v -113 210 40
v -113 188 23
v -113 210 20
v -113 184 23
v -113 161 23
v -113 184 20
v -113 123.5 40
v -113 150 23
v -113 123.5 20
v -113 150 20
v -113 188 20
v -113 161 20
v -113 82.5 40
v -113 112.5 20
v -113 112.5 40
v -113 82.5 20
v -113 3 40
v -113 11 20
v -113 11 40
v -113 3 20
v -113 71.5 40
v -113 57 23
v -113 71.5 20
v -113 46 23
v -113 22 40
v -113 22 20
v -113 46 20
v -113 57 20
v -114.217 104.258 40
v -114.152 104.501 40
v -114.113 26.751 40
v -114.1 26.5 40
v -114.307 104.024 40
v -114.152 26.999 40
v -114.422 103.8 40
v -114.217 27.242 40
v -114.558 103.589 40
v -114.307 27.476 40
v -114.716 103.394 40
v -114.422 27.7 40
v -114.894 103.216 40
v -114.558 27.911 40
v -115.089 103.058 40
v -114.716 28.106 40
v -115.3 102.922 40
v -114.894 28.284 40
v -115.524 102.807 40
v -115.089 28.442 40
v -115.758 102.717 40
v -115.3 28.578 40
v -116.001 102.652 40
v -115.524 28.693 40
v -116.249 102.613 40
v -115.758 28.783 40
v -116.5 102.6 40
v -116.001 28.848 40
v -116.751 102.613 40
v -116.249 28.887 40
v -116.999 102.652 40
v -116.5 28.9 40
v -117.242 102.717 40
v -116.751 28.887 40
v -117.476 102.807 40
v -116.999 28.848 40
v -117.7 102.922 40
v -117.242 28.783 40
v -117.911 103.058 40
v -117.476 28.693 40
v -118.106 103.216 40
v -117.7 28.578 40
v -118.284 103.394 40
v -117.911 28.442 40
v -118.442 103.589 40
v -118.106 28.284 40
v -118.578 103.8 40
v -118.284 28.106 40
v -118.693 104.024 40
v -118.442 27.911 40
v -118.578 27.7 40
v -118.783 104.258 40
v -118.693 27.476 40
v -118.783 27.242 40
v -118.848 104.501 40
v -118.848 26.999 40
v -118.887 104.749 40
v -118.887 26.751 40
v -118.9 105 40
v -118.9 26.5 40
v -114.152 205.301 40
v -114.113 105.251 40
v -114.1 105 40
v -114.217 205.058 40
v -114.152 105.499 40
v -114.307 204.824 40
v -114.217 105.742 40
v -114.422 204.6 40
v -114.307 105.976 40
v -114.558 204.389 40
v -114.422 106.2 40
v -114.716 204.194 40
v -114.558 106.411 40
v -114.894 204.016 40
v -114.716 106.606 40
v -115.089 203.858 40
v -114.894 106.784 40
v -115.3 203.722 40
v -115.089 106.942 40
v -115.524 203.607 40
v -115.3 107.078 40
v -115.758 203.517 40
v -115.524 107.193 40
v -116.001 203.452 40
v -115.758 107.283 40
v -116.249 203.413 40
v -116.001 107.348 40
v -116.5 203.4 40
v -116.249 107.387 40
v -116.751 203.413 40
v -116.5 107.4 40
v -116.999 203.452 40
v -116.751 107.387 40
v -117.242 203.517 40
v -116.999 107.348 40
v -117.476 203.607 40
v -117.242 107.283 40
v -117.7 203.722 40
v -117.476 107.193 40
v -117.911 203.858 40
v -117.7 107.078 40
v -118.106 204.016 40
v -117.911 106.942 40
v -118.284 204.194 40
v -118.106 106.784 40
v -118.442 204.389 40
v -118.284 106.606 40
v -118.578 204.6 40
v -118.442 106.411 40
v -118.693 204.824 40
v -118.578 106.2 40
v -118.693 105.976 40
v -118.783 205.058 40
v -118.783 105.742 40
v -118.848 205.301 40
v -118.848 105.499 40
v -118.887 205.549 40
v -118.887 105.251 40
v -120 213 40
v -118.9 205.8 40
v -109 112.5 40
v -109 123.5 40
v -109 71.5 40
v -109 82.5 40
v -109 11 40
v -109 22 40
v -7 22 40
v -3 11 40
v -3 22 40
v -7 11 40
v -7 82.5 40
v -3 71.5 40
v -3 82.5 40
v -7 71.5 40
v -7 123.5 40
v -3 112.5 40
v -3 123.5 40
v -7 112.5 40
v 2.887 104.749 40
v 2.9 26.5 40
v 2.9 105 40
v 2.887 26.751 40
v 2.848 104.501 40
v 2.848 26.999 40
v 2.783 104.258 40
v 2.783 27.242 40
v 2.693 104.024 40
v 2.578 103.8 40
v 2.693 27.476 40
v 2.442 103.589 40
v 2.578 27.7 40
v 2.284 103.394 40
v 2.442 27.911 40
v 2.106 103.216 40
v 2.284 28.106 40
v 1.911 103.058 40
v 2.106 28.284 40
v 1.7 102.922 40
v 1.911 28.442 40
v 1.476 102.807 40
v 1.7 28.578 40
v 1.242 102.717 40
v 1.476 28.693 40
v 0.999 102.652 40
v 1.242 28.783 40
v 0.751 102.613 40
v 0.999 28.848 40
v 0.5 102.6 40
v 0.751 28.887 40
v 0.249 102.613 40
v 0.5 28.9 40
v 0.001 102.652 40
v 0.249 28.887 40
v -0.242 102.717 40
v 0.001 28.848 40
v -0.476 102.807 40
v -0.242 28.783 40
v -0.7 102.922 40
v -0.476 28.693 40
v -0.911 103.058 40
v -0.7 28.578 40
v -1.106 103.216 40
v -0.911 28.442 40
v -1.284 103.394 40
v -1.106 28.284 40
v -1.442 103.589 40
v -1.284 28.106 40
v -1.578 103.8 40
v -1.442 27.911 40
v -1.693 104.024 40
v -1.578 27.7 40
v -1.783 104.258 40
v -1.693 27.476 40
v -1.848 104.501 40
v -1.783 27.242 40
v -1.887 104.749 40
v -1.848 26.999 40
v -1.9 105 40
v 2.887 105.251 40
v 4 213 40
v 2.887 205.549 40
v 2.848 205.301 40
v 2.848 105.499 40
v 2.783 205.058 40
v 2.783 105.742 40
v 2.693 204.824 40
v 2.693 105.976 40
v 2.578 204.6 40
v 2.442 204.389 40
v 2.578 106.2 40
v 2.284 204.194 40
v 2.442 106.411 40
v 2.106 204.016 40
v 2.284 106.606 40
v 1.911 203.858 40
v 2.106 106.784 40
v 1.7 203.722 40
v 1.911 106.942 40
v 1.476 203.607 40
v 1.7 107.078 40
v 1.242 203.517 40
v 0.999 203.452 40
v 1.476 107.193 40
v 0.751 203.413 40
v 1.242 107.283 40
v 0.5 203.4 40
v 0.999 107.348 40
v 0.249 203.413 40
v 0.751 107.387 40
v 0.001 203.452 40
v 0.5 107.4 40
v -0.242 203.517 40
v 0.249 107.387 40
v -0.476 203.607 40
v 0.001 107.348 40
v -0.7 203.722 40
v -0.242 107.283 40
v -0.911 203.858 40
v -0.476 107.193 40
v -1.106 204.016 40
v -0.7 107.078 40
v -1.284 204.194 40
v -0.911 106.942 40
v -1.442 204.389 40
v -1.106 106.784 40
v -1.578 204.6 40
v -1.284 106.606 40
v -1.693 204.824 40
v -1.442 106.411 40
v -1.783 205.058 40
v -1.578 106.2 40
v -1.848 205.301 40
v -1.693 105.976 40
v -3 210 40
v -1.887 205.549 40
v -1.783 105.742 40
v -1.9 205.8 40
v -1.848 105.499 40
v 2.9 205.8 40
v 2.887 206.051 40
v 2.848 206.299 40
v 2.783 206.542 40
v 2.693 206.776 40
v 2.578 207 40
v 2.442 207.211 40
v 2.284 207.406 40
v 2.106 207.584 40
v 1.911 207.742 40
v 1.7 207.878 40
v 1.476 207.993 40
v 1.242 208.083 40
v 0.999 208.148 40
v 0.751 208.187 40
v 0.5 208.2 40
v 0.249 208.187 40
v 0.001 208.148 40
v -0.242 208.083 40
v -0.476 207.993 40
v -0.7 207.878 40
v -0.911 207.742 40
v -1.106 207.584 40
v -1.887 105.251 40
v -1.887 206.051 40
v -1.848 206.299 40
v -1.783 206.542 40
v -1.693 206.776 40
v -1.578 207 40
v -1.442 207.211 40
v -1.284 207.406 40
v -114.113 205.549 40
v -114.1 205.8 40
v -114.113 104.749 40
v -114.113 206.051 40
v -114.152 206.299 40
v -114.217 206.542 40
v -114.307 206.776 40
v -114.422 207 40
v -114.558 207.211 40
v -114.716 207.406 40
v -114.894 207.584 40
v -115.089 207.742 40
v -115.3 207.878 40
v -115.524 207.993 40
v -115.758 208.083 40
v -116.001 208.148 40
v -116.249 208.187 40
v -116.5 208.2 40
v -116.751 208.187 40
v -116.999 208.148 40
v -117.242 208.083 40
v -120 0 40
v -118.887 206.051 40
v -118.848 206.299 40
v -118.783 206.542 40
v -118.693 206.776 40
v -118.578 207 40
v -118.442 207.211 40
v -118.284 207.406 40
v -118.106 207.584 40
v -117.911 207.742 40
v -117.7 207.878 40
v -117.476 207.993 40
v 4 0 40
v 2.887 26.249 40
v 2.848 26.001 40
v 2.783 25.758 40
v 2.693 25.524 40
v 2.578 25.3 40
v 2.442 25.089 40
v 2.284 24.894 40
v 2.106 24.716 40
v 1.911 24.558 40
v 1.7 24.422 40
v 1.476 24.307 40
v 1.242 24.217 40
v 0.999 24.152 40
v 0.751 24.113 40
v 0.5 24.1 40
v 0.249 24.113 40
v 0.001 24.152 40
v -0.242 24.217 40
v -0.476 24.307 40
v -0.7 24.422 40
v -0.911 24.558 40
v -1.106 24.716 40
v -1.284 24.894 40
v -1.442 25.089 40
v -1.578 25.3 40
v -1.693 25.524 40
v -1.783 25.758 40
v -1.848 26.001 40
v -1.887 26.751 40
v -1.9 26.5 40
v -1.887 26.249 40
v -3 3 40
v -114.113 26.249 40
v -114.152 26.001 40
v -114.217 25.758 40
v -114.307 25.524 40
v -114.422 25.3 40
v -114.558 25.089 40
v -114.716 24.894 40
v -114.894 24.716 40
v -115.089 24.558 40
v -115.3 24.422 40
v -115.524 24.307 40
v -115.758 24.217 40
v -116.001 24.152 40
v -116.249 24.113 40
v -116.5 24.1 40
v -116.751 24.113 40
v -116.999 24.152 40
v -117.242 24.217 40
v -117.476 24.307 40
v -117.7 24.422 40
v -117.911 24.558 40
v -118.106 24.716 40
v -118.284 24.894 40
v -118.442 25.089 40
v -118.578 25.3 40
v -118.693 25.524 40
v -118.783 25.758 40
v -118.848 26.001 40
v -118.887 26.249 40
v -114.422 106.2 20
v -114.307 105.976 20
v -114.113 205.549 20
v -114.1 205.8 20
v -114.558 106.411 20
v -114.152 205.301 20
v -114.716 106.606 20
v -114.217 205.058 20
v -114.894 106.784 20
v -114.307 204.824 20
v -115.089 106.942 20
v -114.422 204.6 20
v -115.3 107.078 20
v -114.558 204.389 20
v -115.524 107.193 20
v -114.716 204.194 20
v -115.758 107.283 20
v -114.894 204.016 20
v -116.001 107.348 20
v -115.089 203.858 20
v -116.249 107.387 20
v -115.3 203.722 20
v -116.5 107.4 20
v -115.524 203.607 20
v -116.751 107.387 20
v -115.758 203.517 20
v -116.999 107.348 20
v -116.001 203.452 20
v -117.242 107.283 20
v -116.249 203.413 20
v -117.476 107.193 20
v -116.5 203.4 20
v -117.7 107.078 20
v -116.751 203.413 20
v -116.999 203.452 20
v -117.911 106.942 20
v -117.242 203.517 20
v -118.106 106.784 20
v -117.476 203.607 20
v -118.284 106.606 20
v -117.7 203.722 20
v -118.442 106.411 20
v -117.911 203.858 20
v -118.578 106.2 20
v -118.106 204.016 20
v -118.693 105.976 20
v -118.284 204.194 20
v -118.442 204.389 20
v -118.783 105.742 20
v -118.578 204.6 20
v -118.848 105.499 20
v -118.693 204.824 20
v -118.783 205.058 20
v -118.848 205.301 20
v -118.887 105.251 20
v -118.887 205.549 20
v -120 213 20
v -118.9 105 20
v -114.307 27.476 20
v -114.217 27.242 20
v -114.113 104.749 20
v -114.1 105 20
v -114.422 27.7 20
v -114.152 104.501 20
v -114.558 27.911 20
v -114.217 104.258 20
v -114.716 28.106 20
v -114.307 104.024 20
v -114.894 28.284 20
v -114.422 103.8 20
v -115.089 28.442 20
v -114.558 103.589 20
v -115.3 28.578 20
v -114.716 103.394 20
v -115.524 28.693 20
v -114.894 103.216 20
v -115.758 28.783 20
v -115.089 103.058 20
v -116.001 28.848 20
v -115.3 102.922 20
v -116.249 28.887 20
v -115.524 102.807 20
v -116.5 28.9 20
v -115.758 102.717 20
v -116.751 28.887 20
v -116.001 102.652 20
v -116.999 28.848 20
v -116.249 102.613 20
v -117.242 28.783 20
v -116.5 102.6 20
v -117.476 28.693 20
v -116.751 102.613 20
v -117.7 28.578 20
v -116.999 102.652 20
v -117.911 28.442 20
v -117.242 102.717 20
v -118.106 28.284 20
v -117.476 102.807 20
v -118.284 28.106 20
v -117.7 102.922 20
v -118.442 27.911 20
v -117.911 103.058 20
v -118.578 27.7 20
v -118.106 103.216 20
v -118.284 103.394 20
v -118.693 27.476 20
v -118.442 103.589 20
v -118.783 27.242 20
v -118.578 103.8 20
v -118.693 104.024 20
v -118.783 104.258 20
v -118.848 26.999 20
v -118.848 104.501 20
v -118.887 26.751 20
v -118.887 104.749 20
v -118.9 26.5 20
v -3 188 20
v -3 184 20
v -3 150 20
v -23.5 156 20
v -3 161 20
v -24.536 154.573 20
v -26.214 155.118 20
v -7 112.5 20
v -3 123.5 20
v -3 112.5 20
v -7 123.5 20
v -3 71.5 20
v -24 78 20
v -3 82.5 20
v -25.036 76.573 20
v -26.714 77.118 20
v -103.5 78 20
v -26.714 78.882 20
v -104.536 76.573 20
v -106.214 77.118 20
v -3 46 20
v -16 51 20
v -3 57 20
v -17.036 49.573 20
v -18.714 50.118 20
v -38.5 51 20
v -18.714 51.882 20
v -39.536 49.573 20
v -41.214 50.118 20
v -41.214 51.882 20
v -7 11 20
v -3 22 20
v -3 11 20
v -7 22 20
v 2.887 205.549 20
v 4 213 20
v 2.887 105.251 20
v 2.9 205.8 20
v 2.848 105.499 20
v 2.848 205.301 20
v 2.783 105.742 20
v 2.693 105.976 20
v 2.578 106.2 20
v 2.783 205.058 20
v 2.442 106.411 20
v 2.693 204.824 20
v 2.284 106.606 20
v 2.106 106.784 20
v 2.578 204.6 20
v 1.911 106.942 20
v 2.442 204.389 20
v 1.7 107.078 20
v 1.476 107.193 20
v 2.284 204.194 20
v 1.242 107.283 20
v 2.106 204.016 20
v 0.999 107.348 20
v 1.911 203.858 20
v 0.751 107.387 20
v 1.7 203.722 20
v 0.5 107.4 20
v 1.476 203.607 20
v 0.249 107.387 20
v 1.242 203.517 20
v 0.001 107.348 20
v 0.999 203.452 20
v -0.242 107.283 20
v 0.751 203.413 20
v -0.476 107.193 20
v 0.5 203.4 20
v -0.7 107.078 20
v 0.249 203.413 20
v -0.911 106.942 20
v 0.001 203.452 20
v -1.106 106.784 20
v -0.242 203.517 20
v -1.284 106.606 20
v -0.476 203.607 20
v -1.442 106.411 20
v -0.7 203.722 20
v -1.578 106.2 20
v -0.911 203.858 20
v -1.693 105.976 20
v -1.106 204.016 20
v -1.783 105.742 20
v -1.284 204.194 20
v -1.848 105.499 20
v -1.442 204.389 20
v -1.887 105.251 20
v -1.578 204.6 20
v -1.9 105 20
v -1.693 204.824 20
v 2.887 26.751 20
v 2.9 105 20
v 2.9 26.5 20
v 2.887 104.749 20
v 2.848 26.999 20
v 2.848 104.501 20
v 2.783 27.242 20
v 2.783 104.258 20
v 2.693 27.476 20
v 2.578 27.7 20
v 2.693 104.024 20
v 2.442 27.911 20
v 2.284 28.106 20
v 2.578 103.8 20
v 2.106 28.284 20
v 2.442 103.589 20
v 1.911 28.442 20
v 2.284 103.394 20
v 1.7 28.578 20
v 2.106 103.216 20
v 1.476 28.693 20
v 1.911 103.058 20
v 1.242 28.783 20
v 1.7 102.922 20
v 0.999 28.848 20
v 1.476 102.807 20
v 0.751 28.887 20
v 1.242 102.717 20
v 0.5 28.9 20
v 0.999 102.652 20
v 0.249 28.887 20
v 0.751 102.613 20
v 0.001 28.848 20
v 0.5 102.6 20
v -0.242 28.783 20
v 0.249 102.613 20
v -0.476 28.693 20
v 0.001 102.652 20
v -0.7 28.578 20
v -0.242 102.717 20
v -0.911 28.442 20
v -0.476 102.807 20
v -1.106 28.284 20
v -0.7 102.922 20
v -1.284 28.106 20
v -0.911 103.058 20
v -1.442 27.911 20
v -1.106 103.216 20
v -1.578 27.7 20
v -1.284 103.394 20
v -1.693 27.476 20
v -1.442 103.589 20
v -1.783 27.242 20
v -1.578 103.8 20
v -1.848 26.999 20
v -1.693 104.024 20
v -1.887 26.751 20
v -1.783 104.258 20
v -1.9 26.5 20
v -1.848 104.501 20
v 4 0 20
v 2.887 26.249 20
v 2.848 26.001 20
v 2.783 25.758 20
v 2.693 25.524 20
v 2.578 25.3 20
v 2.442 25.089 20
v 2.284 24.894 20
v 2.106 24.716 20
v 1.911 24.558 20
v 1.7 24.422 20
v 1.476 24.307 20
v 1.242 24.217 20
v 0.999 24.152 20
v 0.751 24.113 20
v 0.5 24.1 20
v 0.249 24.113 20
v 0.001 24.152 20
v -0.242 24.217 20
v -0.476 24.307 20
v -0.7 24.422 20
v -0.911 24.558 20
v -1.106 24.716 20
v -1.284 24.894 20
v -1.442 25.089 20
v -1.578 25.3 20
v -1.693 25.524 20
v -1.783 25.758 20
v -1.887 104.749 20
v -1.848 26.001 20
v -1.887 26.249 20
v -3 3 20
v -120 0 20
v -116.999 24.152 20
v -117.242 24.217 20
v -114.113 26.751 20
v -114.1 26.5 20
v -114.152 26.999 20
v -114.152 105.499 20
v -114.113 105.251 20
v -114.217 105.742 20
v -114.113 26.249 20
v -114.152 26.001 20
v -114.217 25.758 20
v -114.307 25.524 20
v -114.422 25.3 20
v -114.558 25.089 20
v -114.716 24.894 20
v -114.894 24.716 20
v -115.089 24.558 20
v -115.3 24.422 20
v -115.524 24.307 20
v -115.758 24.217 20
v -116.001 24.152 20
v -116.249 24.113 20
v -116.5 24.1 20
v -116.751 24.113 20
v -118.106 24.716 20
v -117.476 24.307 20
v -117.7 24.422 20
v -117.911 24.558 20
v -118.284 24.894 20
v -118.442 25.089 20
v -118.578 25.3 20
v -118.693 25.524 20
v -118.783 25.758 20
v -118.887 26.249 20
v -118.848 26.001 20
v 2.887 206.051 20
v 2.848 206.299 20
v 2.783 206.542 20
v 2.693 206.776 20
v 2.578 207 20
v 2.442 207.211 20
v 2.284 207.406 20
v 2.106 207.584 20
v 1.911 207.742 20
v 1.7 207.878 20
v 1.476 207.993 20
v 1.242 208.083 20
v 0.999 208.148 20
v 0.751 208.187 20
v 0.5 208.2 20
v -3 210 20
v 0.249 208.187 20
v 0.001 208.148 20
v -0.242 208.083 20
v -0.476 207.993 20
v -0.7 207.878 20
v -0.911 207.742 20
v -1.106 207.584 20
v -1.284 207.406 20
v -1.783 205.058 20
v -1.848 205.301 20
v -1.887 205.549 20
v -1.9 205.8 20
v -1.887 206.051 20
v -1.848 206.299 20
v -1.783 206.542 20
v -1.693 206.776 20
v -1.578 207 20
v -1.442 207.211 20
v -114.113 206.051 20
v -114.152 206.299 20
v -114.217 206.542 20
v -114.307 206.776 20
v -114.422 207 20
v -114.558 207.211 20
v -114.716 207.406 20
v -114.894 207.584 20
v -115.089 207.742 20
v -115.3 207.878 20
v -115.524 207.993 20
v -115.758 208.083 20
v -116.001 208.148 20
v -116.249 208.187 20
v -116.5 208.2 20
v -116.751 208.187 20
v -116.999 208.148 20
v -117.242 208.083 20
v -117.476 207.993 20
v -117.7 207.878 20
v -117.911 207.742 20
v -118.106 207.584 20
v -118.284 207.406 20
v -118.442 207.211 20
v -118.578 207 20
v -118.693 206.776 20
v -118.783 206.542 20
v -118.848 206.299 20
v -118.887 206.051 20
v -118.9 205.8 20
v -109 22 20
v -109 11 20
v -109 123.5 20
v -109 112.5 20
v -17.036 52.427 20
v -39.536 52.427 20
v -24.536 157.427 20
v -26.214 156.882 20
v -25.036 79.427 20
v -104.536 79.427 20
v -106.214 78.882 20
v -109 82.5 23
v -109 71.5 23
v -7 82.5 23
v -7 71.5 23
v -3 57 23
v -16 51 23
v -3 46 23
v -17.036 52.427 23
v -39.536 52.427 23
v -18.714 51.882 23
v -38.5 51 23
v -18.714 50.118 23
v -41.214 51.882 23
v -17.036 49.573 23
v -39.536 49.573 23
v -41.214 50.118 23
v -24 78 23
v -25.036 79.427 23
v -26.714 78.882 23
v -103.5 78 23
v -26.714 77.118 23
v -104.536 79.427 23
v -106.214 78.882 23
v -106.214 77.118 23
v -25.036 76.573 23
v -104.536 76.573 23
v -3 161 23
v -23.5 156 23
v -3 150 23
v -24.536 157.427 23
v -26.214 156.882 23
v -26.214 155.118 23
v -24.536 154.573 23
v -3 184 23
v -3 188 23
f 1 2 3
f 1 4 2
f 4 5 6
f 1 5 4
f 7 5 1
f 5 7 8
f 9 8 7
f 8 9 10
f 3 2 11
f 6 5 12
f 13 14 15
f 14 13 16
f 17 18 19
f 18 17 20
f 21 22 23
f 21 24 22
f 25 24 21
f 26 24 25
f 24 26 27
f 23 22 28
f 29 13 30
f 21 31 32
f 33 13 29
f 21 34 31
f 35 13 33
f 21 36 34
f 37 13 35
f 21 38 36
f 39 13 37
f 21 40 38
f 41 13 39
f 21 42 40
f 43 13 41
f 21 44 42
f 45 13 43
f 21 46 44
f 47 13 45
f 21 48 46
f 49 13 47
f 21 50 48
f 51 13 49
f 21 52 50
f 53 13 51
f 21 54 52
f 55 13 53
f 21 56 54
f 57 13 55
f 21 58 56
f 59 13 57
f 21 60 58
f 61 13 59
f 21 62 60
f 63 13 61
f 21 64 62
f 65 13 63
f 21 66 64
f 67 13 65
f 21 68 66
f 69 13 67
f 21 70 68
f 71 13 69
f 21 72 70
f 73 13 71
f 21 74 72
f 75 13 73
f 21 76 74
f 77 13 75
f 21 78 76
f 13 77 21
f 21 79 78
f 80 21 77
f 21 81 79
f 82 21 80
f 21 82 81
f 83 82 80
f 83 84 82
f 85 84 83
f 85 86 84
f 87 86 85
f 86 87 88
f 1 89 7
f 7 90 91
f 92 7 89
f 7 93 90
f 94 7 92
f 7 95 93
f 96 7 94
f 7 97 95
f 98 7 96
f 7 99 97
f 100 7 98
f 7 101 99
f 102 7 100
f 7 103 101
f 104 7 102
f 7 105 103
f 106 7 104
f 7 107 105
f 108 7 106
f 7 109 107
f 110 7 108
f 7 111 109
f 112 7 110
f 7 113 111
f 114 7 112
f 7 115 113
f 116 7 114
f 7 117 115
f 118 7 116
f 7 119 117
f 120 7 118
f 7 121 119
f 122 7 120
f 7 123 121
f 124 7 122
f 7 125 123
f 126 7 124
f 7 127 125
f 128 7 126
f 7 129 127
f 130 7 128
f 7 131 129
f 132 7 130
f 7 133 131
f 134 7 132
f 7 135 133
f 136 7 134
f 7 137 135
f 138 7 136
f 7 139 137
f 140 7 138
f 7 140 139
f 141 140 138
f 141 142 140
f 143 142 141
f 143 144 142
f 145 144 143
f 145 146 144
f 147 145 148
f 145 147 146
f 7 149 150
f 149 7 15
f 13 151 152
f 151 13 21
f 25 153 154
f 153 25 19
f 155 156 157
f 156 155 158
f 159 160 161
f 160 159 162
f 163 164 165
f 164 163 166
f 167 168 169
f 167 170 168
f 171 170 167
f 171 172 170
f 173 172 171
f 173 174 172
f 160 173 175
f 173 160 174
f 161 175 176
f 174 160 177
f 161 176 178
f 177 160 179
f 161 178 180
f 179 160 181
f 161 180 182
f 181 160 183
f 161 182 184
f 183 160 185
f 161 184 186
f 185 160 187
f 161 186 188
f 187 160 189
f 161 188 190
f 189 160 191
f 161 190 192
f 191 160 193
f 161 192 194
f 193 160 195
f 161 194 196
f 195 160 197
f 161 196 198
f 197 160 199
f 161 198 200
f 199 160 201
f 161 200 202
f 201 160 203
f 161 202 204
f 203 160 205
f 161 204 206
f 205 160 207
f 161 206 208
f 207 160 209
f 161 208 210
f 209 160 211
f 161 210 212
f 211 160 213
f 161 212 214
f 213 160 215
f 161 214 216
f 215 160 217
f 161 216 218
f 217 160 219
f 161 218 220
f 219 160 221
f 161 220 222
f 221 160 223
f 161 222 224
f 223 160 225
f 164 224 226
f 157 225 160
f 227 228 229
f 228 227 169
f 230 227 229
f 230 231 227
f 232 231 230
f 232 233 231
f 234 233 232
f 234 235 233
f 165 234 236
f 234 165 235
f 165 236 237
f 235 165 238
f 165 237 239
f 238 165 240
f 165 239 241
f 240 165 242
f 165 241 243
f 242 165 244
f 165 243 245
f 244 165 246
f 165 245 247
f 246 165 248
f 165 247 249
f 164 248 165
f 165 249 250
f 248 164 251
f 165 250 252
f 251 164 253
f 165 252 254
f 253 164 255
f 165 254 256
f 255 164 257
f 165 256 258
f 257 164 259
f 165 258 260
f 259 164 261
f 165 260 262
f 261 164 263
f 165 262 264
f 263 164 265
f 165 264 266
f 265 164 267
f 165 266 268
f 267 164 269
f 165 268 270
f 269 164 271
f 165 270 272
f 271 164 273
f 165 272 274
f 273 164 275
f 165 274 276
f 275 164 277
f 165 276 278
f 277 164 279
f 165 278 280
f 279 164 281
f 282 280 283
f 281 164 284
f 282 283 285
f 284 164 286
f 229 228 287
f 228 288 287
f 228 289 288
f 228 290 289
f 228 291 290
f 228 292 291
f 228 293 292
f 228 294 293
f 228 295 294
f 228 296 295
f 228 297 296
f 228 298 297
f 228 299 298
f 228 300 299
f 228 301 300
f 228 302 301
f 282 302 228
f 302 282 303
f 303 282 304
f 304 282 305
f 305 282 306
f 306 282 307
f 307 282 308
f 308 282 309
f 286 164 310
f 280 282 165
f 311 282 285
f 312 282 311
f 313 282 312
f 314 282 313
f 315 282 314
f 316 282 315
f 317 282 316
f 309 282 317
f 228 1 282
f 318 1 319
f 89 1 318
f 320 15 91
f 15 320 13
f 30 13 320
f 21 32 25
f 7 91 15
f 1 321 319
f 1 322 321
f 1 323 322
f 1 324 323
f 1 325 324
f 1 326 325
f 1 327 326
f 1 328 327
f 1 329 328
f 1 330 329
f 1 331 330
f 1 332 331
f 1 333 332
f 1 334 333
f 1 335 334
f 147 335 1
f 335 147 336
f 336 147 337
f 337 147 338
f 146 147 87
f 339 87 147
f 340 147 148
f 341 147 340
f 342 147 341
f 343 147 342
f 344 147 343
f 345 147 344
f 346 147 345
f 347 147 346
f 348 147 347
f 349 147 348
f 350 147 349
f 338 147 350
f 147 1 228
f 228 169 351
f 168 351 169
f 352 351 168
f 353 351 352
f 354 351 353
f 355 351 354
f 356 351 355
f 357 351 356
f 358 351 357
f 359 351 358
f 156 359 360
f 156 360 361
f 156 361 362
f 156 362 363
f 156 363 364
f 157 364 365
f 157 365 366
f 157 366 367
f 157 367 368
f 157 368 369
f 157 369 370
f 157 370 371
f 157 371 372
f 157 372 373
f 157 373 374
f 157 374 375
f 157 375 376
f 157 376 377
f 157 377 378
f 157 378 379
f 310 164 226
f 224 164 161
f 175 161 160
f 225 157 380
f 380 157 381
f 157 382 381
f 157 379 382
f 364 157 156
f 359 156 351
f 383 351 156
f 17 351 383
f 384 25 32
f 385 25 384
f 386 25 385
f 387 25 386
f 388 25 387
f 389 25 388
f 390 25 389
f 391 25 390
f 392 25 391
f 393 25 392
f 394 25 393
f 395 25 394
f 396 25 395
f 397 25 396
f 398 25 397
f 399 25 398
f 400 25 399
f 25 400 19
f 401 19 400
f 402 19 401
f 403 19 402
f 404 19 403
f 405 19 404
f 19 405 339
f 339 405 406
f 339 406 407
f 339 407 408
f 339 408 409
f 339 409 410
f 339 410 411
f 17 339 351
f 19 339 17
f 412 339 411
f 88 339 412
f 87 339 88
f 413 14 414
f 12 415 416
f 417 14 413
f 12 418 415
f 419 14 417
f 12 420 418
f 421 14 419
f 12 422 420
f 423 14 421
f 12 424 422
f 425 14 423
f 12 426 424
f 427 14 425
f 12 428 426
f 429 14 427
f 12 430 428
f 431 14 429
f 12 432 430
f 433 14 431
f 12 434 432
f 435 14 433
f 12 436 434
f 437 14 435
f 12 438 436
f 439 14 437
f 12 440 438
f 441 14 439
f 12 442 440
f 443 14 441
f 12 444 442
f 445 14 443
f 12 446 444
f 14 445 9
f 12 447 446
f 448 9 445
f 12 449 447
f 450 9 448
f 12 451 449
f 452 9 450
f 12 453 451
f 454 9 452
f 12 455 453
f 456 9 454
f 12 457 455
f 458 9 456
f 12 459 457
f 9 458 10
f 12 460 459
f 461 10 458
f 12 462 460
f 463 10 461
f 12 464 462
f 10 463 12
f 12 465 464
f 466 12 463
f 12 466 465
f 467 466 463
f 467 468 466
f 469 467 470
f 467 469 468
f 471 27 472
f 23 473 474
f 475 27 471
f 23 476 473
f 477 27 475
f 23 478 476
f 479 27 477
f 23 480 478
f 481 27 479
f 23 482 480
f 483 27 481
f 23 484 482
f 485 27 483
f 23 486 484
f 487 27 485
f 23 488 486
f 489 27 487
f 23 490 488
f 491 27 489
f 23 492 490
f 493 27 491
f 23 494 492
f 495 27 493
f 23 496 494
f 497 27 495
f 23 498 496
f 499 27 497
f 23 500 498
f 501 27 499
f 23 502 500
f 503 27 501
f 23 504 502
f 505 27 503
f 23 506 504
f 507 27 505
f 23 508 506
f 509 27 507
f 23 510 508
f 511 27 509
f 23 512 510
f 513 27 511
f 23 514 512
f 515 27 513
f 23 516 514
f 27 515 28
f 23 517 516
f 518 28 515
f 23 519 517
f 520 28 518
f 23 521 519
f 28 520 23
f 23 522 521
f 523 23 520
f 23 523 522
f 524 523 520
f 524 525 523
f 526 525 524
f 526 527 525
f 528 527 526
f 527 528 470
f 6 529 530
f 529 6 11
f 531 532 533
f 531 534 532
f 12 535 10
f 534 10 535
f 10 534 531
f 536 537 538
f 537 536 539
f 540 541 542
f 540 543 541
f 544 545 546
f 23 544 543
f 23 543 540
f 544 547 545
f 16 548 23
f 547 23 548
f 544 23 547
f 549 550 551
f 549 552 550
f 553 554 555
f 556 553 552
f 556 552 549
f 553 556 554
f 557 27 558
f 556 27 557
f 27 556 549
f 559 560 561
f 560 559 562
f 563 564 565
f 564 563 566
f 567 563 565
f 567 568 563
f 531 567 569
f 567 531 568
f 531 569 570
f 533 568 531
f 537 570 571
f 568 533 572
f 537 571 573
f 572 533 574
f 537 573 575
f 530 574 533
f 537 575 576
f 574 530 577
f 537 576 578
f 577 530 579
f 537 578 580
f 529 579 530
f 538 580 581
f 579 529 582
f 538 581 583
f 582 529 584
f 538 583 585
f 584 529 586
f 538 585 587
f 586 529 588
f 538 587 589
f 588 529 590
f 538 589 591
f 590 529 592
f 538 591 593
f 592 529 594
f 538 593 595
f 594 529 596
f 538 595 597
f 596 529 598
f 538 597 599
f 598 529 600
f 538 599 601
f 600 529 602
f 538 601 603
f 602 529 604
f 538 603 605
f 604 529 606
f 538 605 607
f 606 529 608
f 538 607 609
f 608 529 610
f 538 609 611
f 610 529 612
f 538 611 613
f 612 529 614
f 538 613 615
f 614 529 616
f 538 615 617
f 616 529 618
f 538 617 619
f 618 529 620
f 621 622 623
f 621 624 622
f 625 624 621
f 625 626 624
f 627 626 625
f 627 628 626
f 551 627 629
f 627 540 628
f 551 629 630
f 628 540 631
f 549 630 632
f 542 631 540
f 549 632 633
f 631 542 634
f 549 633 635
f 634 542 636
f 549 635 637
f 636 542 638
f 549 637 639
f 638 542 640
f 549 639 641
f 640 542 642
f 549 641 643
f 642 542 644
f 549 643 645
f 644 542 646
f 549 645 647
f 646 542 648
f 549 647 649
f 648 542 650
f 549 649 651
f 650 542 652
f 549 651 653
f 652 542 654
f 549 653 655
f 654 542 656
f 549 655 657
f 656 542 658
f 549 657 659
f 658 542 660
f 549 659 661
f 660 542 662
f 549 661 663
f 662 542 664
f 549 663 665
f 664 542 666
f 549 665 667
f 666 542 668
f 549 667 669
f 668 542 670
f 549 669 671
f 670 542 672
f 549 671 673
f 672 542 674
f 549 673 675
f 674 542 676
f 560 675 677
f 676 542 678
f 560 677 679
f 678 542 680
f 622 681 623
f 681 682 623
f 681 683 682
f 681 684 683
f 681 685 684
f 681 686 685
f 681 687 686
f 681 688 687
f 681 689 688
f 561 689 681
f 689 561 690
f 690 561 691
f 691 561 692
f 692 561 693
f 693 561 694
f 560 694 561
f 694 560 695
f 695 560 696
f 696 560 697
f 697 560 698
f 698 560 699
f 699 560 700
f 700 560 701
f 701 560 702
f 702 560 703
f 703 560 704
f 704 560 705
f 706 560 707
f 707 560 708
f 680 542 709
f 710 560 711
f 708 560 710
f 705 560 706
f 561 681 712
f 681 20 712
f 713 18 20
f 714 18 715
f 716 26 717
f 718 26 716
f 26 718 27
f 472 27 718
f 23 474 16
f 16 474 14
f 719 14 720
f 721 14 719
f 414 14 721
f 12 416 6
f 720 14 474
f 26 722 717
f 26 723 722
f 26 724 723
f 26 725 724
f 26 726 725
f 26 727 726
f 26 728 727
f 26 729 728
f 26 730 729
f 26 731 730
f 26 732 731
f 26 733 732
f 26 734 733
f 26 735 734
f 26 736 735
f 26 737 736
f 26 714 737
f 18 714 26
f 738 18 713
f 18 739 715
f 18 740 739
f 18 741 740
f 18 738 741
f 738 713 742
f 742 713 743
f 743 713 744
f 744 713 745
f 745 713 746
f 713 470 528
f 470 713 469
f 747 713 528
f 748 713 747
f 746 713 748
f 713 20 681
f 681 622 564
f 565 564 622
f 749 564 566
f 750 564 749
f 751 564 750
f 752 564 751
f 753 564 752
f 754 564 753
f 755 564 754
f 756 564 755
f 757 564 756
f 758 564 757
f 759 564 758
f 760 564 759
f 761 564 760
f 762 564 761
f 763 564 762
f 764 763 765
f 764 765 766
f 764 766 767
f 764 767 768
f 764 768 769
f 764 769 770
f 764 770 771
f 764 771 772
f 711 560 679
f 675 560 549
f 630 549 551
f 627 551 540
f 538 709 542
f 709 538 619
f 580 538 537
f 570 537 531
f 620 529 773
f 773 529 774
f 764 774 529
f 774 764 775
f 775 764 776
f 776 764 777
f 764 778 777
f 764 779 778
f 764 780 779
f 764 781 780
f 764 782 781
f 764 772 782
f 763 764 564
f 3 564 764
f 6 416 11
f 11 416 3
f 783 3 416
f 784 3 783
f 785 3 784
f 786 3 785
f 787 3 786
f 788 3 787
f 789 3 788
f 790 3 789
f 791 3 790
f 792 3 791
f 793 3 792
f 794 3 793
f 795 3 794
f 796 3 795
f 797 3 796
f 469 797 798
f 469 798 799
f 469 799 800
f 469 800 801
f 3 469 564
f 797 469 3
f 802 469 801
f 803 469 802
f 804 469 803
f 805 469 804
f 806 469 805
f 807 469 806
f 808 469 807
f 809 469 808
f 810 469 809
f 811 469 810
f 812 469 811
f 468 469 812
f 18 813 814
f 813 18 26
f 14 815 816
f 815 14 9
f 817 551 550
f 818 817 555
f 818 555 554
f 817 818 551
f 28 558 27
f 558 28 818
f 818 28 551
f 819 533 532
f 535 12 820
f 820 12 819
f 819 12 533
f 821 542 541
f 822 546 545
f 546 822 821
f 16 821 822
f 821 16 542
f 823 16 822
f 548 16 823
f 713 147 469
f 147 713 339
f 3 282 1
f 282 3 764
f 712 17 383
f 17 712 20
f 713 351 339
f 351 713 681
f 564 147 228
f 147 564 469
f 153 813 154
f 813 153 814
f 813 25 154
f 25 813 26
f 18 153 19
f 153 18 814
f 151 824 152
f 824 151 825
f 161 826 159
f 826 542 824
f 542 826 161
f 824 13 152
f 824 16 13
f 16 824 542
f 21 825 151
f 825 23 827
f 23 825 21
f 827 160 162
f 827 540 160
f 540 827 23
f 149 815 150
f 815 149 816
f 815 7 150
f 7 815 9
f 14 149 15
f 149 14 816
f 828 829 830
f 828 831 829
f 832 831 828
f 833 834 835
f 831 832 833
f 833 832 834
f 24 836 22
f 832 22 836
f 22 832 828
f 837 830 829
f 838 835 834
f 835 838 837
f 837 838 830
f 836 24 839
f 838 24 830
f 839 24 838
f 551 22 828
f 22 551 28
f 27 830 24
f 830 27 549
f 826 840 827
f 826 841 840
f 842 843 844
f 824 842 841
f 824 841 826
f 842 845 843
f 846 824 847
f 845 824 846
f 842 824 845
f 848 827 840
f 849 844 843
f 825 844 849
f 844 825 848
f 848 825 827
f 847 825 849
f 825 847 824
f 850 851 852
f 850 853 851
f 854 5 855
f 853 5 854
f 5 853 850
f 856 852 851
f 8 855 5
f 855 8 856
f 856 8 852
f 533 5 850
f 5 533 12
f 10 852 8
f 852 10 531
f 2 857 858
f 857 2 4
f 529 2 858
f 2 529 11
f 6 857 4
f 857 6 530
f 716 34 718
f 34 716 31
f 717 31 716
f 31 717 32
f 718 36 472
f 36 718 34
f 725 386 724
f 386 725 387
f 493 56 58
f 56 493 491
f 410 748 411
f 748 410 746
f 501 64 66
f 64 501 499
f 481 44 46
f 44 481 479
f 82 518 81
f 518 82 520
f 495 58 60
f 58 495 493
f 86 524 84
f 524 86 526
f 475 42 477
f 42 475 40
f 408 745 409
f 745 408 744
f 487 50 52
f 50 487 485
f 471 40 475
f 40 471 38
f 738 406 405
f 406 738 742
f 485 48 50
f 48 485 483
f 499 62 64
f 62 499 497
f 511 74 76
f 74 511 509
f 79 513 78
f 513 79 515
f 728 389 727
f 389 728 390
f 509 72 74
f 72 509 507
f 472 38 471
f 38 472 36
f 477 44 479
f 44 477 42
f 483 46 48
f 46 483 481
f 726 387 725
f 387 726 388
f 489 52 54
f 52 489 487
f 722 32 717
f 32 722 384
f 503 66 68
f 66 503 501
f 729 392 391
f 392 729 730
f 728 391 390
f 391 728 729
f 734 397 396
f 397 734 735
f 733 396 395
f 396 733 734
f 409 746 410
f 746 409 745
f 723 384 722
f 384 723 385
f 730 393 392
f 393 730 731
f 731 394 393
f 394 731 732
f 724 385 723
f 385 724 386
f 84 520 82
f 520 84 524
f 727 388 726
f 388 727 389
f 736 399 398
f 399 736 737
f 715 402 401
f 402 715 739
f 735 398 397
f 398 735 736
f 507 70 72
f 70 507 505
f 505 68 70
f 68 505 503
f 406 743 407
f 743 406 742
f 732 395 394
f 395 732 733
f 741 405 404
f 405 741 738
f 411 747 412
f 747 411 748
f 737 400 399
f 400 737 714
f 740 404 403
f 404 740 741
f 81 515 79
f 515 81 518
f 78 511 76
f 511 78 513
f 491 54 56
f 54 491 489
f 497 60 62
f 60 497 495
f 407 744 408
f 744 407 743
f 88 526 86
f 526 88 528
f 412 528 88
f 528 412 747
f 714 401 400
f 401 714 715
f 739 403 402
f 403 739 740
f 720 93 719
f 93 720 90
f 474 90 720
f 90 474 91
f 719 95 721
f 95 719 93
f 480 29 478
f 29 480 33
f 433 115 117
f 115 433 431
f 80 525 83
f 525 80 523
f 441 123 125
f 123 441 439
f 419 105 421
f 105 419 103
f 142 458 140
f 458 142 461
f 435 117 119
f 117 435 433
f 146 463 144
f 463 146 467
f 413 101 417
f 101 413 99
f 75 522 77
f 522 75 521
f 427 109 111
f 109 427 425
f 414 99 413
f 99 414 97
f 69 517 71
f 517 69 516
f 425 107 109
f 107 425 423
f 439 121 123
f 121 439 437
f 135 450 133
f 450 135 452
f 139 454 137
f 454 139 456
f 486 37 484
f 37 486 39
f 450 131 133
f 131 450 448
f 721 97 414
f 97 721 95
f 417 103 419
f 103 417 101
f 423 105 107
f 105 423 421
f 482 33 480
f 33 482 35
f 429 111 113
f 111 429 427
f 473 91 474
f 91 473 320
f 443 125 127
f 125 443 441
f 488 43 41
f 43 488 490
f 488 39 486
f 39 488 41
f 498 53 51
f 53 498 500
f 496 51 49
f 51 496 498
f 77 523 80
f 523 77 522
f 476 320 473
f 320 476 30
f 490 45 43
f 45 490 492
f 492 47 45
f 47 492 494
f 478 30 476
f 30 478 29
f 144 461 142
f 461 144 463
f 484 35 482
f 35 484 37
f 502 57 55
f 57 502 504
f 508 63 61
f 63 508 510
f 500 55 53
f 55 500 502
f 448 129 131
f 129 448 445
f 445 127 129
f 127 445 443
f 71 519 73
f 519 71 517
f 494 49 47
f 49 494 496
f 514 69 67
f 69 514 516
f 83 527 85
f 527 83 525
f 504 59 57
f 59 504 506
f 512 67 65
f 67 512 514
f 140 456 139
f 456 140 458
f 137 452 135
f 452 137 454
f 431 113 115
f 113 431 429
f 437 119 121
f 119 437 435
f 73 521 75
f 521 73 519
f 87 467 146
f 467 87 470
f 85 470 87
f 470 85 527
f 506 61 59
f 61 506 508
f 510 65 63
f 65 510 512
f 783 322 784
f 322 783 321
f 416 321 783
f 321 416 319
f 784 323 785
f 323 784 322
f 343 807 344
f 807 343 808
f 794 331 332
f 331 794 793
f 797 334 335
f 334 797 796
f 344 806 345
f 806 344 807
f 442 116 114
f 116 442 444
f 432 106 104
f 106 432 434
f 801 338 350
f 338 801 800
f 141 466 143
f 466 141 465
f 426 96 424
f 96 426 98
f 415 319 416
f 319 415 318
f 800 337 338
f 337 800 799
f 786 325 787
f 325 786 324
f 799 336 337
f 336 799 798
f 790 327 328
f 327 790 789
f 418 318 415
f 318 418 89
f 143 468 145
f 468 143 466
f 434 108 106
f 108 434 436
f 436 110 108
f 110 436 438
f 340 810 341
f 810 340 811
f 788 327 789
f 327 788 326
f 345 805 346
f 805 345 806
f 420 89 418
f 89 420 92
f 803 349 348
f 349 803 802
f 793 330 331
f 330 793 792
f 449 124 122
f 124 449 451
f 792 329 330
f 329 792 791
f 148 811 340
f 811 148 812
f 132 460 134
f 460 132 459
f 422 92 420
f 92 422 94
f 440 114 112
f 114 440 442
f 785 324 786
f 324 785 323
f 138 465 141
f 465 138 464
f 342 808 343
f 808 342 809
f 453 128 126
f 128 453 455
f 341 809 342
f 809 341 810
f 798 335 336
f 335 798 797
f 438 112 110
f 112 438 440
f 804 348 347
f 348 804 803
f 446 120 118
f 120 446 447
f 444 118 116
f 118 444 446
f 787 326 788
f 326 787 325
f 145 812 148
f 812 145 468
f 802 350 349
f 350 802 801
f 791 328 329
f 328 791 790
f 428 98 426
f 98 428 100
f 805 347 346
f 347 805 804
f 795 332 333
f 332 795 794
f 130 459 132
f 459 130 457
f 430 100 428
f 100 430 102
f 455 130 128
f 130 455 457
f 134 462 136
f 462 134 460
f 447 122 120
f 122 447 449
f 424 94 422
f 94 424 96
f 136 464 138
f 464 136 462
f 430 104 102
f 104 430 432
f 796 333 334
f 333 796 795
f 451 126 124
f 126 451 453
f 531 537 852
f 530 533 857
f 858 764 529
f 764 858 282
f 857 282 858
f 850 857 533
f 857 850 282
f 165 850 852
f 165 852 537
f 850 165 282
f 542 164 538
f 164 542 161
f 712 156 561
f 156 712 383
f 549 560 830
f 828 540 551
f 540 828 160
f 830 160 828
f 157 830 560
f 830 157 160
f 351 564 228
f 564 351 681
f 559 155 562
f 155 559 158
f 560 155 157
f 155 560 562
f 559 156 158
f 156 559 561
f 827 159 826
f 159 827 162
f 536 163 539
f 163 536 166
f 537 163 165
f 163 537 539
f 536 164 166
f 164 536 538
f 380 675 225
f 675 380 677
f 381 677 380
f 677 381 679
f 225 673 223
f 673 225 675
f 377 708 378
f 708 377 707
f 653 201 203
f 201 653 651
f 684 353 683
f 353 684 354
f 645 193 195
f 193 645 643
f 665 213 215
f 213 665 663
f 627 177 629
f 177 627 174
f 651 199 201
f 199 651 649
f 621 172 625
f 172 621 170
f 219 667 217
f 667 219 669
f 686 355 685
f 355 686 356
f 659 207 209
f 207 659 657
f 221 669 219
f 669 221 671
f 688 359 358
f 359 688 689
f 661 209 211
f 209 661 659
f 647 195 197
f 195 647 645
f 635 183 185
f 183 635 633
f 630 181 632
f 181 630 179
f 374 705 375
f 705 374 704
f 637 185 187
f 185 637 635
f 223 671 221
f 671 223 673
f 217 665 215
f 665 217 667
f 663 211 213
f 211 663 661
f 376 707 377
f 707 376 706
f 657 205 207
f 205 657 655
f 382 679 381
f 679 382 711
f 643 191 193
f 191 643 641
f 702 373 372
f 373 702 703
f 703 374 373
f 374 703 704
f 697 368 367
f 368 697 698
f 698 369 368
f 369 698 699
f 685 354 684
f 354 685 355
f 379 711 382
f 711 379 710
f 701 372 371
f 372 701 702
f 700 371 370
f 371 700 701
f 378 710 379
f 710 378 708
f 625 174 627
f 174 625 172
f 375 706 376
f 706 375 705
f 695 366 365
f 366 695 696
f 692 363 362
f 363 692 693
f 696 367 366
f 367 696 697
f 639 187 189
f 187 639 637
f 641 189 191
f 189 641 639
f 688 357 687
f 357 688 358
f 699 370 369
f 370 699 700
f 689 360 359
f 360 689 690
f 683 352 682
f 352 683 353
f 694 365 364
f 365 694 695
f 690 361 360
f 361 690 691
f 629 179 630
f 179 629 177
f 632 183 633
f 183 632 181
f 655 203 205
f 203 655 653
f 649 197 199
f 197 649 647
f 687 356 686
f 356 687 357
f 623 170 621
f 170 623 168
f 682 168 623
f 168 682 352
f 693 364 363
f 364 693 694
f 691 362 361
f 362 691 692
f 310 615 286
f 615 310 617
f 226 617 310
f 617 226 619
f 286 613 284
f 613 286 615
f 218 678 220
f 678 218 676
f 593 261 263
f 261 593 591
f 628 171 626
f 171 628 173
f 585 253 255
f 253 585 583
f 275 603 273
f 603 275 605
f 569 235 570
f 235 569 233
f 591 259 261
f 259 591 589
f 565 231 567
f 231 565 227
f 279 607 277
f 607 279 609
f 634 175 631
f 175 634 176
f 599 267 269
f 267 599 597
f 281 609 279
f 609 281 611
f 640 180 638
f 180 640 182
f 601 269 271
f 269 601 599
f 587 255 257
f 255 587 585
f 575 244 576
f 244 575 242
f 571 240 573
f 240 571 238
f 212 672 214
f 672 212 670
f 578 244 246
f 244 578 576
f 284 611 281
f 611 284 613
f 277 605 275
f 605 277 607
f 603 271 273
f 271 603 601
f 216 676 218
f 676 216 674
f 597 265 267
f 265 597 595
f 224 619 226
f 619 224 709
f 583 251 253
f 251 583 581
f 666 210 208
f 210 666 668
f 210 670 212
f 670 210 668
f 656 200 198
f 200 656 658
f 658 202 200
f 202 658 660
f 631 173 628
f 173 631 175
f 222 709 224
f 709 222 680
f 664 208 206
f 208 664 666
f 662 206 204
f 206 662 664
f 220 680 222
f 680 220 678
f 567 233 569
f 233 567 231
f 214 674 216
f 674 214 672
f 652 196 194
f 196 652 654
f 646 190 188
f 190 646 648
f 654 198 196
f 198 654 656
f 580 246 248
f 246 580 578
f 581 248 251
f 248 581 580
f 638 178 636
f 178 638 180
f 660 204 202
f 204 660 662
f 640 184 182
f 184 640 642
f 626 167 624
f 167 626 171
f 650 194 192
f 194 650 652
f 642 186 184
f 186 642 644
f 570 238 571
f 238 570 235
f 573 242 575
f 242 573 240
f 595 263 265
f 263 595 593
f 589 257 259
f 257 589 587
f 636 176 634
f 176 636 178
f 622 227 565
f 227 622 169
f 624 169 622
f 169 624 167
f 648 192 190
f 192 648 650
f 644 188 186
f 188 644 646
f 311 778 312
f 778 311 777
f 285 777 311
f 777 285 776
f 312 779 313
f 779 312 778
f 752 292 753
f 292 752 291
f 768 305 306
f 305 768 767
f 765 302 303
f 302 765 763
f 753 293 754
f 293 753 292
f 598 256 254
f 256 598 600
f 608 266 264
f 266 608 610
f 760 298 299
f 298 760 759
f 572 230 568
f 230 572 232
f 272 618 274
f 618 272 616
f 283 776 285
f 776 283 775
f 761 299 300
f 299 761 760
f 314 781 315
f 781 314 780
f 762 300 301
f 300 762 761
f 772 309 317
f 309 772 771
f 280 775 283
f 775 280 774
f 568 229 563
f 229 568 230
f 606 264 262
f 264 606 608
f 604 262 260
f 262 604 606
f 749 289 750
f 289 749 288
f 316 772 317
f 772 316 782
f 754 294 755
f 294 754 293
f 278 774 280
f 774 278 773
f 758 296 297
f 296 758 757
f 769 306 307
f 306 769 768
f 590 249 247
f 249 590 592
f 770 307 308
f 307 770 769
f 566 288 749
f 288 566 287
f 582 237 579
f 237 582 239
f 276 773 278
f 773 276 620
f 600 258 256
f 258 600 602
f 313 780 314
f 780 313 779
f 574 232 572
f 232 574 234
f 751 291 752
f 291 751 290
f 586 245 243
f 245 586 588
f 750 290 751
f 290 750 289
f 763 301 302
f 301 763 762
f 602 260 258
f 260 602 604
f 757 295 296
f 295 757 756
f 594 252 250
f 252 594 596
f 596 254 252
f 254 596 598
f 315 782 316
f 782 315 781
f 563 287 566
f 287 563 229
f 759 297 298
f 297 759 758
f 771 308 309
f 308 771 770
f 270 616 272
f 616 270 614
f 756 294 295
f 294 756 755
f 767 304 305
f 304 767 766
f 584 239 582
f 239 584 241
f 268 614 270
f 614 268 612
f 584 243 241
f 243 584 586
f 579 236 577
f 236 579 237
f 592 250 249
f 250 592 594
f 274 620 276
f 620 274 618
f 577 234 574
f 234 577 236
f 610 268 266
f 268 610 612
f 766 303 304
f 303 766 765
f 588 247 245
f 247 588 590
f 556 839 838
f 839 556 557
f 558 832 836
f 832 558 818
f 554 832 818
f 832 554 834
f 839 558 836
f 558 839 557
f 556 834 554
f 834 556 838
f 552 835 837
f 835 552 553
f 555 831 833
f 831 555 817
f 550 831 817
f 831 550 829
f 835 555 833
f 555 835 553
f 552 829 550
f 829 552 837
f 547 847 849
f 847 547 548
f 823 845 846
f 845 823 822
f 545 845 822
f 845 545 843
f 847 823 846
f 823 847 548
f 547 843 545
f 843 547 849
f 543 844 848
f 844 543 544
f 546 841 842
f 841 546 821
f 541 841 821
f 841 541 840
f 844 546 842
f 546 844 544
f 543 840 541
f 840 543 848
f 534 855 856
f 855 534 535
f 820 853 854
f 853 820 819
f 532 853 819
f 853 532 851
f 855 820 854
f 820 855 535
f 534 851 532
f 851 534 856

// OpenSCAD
// file: inc/rack_item_new.scad
module mount_unions(
  pos=[0,0,0], h=3
) {
	echo(pos,pos);
	#translate(pos) cylinder(d=7,h=h);
}
module mount_differences(
  pos=[0,0,0]
) {
	translate(pos) cylinder(d=3,h=10,$fn=5);
}

module both_sides(
	mount1_pos=[80,13+35,0], mount2_pos=[80+22.5,13+35,0],
	mount3_pos=[7+7/2+4.5,75,0],mount4_pos=[7+7/2+4.5+79.5,75,0],
	mount5_pos=[95,153,0],
) {
	difference() {
		union() {
			side_wall();
			translate([124,0,0]) mirror([1,0,0]) side_wall();
			mount_unions(pos=mount1_pos);	
			mount_unions(pos=mount2_pos);
			mount_unions(pos=mount3_pos);	
			mount_unions(pos=mount4_pos);
			mount_unions(pos=mount5_pos);
		}
		mount_differences(pos=mount1_pos);
		mount_differences(pos=mount2_pos);
		mount_differences(pos=mount3_pos);
		mount_differences(pos=mount4_pos);
		mount_differences(pos=mount5_pos);
	}
}

module side_wall (
	front=[70,3,20],
	rear=[70,3,20],
	side=[7,207,20], // sl,sd,side_height
	pillar1_pos=[7,8,0], pillar1_dim=[4,11,20],
	pillar2_pos=[7,68.5,0], pillar2_dim=[4,11,20],
	pillar3_pos=[7,109.5,0], pillar3_dim=[4,11,20],
	rod1_pos=[5/2+1.0,23.5,0], 
	rod2_pos=[5/2+1.0,102,0], 
	rod3_pos=[5/2+1.0,202.8,0], 
	rod_d=4.8, rod_h=41,
	bridge1_pos=[7,43,0], bridge1_dim=[70,11,3],
	bridge2_pos=[0,68.5,0], bridge2_dim=[70,11,3],
	//bridge3_pos=[0,109.5,0], bridge3_dim=[70,11,3],
	bridge4_pos=[0,147,0], bridge4_dim=[70,11,3],
	bridge5_pos=[0,181,0], bridge5_dim=[70,4,3],
) {
	difference() {
		union() {
			cube(side);
			translate([0,-front[1],0]) cube(front);
			translate([0,side[1],0]) {
				cube(rear);
			}
			translate(pillar1_pos) cube(pillar1_dim);
			translate(pillar2_pos) cube(pillar2_dim);
			translate(pillar3_pos) cube(pillar3_dim);

			#translate(bridge1_pos) cube(bridge1_dim);
			translate(bridge2_pos) cube(bridge2_dim);
			//translate(bridge3_pos) cube(bridge3_dim);
			translate(bridge4_pos) cube(bridge4_dim);
			translate(bridge5_pos) cube(bridge5_dim);
		}
		// rods
		translate(rod1_pos) cylinder(d=rod_d, h=rod_h);
		translate(rod2_pos) cylinder(d=rod_d, h=rod_h);
		translate(rod3_pos) cylinder(d=rod_d, h=rod_h);
	}
}
// main file
include <inc/rack_item_new.scad>
include <inc/rack_item.scad>

union() {
//	both_parts(drive=true, power=false, board=false);
	color("red")  
		translate([-120,3,20]) 
			//side_wall();
			both_sides();
}
